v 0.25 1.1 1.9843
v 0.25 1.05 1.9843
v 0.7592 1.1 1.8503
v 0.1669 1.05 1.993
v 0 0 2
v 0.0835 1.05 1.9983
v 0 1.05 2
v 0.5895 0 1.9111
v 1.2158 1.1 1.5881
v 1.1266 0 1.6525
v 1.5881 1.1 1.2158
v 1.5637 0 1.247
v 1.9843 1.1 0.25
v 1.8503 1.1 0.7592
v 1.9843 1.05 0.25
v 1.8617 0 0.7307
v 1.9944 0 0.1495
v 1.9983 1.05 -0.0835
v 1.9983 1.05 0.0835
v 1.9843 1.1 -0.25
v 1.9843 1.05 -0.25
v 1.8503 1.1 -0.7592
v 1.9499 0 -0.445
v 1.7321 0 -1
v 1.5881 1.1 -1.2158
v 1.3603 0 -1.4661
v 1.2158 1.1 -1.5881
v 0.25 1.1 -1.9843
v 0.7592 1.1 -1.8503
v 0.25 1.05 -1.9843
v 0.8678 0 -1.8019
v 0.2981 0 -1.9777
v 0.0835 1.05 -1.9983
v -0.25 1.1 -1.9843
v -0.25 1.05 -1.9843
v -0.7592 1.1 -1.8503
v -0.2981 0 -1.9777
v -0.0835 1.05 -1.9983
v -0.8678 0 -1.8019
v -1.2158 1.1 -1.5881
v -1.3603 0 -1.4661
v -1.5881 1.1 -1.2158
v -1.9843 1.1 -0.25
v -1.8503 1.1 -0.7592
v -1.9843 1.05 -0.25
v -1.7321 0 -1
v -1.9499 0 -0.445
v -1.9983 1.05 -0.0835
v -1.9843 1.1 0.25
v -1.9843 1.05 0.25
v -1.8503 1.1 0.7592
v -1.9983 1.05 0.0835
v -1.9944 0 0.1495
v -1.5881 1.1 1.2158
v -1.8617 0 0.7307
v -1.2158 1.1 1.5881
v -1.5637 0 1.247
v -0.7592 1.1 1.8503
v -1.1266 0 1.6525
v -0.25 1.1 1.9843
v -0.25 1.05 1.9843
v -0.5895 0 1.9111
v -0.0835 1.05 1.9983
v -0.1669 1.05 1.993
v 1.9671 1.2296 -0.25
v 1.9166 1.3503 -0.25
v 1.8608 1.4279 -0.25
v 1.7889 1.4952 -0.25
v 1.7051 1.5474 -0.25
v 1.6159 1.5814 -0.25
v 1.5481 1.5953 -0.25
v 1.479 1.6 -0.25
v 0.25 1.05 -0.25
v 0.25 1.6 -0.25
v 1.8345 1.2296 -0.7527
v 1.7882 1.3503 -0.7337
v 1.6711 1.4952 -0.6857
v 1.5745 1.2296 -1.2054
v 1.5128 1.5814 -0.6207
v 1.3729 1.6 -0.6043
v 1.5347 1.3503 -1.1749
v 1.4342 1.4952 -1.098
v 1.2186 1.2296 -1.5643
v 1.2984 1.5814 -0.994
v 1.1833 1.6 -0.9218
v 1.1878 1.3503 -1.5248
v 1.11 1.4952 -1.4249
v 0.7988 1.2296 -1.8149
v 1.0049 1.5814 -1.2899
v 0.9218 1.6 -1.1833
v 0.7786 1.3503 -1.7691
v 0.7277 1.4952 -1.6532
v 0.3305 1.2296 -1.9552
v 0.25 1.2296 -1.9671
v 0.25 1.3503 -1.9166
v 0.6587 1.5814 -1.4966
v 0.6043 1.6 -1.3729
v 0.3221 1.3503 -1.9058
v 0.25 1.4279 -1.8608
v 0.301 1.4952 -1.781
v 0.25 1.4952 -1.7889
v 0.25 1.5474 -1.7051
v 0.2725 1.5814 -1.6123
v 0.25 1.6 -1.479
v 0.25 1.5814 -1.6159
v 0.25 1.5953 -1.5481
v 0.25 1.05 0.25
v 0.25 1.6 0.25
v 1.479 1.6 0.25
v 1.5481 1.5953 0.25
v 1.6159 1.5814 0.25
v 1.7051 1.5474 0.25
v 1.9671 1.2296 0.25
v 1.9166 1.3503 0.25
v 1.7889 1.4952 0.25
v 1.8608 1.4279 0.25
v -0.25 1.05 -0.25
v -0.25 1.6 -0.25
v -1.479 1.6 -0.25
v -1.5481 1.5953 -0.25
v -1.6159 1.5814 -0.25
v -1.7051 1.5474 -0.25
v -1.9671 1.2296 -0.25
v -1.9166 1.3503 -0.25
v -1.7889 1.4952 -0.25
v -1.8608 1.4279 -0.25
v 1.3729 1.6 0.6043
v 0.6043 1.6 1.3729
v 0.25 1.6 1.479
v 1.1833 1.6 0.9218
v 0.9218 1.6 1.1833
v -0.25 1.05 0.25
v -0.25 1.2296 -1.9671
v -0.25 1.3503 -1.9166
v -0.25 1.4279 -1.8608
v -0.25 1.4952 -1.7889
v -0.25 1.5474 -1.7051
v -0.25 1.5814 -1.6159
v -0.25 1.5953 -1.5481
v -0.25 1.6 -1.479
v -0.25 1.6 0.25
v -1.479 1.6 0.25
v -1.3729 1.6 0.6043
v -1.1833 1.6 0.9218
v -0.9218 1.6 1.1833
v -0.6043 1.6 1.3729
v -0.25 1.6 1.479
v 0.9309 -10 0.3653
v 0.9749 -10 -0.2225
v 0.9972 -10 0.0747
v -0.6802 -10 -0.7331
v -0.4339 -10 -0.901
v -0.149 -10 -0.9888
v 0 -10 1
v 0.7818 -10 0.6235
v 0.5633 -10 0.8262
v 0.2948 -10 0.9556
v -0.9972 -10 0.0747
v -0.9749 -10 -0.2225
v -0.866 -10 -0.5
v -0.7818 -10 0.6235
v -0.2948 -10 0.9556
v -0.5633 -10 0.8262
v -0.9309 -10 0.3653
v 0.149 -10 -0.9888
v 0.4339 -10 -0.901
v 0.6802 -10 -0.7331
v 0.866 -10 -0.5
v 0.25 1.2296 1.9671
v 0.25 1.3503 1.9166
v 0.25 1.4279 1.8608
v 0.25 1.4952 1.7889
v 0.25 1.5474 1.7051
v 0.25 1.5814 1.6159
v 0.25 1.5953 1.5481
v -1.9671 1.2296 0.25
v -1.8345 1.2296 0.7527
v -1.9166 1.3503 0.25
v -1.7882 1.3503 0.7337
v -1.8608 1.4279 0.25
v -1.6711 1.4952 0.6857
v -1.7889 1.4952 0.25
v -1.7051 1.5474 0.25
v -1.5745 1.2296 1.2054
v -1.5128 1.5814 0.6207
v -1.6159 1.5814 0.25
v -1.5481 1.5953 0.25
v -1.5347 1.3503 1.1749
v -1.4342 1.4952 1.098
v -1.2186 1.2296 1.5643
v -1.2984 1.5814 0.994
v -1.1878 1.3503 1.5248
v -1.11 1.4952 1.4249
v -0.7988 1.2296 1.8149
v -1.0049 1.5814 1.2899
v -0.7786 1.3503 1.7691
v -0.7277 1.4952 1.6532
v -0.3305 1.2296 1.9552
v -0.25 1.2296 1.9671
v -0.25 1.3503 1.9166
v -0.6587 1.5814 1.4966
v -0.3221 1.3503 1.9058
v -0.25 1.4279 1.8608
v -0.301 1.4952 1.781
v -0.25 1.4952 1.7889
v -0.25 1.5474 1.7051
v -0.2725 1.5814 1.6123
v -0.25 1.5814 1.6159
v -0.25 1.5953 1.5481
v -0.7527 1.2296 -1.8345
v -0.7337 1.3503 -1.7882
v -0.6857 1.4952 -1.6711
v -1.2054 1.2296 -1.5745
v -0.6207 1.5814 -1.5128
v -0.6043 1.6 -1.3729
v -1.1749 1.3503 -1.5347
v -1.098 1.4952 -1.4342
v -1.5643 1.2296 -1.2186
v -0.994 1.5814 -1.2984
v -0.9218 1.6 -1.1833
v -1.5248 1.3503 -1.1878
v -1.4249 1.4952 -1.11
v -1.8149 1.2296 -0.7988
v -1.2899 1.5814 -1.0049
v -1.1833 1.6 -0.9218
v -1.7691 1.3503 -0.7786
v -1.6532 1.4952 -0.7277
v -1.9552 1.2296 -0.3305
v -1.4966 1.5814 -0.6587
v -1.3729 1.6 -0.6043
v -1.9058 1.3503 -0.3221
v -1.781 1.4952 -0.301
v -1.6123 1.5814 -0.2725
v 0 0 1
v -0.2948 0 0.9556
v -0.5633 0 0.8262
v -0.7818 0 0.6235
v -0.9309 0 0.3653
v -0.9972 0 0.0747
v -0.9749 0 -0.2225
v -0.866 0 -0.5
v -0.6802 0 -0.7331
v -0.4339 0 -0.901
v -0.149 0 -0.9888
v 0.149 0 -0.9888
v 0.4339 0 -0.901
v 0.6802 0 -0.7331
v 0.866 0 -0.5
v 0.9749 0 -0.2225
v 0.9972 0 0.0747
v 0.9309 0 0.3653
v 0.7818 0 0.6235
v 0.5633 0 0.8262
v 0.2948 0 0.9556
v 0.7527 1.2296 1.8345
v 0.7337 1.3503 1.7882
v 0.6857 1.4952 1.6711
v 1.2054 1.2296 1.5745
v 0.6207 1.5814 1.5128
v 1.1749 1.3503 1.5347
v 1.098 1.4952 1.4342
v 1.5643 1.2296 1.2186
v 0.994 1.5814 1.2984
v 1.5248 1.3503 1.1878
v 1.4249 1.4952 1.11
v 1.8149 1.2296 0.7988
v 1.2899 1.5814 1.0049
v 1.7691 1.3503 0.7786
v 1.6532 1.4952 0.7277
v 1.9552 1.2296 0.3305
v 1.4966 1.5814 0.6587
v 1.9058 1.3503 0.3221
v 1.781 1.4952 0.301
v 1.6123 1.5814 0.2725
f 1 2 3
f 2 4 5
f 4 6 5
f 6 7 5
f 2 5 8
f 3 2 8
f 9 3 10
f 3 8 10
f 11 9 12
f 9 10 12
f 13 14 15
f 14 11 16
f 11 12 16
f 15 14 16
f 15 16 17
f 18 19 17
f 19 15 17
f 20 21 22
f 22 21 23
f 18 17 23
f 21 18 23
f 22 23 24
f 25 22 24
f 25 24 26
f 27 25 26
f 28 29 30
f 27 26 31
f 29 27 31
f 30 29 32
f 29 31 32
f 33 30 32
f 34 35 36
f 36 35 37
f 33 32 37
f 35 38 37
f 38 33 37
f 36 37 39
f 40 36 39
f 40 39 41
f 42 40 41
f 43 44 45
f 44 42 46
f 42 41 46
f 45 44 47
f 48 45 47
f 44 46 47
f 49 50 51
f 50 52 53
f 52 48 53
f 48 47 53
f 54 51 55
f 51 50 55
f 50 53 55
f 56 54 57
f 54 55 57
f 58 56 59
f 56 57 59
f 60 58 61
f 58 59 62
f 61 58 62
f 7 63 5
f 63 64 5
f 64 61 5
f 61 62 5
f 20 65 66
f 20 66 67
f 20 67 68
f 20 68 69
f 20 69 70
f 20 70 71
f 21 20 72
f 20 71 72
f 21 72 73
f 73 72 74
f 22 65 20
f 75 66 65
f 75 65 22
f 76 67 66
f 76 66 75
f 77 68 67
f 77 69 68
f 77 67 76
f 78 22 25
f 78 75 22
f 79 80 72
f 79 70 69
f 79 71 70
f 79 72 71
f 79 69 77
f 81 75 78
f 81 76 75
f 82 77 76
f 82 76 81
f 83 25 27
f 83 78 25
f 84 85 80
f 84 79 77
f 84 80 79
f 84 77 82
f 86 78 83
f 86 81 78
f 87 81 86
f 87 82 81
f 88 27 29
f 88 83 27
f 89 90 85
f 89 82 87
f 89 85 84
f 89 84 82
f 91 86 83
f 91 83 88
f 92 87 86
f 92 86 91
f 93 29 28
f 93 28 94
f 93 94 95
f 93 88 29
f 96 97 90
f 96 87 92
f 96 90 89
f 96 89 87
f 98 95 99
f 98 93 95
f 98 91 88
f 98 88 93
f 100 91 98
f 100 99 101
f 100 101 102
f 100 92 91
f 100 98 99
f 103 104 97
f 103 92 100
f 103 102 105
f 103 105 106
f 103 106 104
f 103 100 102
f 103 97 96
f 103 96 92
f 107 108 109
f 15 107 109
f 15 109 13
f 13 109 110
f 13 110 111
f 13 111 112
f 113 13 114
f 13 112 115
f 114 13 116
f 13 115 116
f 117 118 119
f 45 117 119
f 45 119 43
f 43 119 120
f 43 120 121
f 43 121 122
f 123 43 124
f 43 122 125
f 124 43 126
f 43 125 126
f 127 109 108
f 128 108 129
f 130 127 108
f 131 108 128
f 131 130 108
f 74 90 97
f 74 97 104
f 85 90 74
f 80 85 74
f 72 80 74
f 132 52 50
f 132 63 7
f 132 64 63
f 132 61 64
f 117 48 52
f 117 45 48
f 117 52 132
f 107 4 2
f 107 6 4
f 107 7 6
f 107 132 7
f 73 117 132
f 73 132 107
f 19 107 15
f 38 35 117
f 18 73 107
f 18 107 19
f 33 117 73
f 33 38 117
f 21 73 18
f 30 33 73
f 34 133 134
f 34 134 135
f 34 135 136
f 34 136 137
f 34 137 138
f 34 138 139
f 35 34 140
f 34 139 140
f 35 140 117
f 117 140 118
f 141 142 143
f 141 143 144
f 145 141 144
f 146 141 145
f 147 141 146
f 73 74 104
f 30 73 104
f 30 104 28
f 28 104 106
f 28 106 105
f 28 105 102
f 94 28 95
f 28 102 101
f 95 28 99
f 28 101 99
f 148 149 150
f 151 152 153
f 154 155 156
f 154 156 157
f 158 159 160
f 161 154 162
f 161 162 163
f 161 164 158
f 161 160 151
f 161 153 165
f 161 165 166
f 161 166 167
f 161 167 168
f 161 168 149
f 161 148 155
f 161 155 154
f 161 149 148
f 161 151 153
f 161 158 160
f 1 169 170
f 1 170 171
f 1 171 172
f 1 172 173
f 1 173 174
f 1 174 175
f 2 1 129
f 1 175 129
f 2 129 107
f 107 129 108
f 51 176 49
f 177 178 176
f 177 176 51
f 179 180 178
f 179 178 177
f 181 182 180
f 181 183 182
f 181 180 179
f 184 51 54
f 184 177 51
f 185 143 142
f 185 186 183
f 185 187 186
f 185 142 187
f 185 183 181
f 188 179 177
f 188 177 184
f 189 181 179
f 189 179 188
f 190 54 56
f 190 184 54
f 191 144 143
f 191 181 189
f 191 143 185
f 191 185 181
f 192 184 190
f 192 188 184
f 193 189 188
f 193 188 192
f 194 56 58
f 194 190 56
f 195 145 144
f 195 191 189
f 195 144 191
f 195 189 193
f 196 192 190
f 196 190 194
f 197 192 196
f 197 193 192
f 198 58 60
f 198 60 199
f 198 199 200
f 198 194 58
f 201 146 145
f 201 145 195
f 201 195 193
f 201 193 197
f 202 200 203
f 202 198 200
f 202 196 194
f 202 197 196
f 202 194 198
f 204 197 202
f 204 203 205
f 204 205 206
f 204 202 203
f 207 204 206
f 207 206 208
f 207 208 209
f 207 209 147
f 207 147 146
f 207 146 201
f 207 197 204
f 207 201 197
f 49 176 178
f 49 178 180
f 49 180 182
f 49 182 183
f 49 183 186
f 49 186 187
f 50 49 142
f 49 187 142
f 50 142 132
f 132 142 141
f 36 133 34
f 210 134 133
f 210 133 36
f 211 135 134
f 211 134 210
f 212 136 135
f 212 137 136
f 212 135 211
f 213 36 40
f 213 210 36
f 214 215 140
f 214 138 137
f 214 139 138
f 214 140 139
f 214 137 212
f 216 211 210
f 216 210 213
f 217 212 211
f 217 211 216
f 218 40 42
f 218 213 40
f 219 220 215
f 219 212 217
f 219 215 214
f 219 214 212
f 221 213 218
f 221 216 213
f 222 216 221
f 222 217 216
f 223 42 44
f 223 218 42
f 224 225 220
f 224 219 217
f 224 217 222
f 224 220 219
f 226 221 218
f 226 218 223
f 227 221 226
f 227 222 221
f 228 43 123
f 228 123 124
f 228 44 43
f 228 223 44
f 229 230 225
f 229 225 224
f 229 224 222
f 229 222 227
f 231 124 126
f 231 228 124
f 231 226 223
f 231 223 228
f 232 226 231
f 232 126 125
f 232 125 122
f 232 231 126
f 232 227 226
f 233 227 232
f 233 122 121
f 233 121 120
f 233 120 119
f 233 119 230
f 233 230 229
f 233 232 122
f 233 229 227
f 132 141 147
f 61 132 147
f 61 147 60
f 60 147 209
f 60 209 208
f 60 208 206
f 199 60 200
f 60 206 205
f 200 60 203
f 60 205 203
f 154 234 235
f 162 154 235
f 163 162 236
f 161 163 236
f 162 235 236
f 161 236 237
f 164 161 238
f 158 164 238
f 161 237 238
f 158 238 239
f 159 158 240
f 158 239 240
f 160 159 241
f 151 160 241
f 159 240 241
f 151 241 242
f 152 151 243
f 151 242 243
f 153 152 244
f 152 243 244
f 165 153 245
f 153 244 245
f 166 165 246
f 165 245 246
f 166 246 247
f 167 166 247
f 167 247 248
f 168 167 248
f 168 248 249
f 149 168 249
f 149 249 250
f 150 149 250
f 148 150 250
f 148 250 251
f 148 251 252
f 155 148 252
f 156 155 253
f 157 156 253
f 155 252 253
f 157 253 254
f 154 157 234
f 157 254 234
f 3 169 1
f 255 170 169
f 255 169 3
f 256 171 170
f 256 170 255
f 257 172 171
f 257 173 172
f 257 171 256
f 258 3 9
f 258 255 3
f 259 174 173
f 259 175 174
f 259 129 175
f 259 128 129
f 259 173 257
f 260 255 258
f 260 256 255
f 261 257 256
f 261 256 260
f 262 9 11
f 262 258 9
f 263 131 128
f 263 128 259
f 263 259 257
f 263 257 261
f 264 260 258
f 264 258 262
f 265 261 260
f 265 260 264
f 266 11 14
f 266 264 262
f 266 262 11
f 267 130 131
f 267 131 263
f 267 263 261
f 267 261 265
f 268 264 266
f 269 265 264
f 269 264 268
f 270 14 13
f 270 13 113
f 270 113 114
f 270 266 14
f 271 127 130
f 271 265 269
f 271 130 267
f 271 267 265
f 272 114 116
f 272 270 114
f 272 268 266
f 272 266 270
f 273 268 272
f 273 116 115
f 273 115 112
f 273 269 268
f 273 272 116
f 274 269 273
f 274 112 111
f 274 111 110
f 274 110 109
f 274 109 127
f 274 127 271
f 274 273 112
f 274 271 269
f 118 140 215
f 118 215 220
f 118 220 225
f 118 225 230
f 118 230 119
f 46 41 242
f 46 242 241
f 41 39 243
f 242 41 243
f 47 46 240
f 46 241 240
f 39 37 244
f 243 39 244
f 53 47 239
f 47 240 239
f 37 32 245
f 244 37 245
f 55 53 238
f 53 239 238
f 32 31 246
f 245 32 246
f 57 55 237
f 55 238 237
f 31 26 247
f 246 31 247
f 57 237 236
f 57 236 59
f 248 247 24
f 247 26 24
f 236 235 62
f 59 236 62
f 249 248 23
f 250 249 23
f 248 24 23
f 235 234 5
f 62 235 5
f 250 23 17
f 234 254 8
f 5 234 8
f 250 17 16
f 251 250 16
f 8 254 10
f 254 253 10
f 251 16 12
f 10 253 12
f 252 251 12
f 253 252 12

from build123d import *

# Parameters (mm, degrees)
SKETCH1_R           = 2
BOSS_EXTRUDE1_DEPTH = 1.6
SKETCH2_R           = 1
BOSS_EXTRUDE2_DEPTH = 10
FILLET1_R           = 0.5
CUT_EXTRUDE1_DEPTH  = 0.55


with BuildPart() as part:
    # Sketch1 → Boss-Extrude1 (new body)
    with BuildSketch(Plane(origin=(0, 0, 0), x_dir=(1, 0, 0), z_dir=(0, 1, 0))):
        with Locations(Location((0, 0, 0), (0, 0, 270))):
            Circle(SKETCH1_R)
    extrude(amount=BOSS_EXTRUDE1_DEPTH)

    # Sketch2 → Boss-Extrude2 (add)
    with BuildSketch(Plane.XZ):
        with Locations(Location((0, 0, 0), (0, 0, 90))):
            Circle(SKETCH2_R)
    extrude(amount=BOSS_EXTRUDE2_DEPTH)

    # Fillet1
    fillet1_edges = [part.edges().sort_by_distance(p)[0] for p in [
        (0, 1.6, -2),
    ]]
    fillet(fillet1_edges, radius=FILLET1_R)

    # Sketch3 → Cut-Extrude1 (cut)
    with BuildSketch(Plane(origin=(0, 1.6, 0), x_dir=(1, 0, 0), z_dir=(0, 1, 0))):
        Polygon((-2, -0.25), (-0.25, -0.25), (-0.25, -2), (0.25, -2), (0.25, -0.25), (2, -0.25), (2, 0.25), (0.25, 0.25), (0.25, 2), (-0.06766133, 2.298366751), (-0.25, 2), (-0.25, 0.25), (-2, 0.25), align=None)
    extrude(amount=-CUT_EXTRUDE1_DEPTH, mode=Mode.SUBTRACT)


solid = part.part
